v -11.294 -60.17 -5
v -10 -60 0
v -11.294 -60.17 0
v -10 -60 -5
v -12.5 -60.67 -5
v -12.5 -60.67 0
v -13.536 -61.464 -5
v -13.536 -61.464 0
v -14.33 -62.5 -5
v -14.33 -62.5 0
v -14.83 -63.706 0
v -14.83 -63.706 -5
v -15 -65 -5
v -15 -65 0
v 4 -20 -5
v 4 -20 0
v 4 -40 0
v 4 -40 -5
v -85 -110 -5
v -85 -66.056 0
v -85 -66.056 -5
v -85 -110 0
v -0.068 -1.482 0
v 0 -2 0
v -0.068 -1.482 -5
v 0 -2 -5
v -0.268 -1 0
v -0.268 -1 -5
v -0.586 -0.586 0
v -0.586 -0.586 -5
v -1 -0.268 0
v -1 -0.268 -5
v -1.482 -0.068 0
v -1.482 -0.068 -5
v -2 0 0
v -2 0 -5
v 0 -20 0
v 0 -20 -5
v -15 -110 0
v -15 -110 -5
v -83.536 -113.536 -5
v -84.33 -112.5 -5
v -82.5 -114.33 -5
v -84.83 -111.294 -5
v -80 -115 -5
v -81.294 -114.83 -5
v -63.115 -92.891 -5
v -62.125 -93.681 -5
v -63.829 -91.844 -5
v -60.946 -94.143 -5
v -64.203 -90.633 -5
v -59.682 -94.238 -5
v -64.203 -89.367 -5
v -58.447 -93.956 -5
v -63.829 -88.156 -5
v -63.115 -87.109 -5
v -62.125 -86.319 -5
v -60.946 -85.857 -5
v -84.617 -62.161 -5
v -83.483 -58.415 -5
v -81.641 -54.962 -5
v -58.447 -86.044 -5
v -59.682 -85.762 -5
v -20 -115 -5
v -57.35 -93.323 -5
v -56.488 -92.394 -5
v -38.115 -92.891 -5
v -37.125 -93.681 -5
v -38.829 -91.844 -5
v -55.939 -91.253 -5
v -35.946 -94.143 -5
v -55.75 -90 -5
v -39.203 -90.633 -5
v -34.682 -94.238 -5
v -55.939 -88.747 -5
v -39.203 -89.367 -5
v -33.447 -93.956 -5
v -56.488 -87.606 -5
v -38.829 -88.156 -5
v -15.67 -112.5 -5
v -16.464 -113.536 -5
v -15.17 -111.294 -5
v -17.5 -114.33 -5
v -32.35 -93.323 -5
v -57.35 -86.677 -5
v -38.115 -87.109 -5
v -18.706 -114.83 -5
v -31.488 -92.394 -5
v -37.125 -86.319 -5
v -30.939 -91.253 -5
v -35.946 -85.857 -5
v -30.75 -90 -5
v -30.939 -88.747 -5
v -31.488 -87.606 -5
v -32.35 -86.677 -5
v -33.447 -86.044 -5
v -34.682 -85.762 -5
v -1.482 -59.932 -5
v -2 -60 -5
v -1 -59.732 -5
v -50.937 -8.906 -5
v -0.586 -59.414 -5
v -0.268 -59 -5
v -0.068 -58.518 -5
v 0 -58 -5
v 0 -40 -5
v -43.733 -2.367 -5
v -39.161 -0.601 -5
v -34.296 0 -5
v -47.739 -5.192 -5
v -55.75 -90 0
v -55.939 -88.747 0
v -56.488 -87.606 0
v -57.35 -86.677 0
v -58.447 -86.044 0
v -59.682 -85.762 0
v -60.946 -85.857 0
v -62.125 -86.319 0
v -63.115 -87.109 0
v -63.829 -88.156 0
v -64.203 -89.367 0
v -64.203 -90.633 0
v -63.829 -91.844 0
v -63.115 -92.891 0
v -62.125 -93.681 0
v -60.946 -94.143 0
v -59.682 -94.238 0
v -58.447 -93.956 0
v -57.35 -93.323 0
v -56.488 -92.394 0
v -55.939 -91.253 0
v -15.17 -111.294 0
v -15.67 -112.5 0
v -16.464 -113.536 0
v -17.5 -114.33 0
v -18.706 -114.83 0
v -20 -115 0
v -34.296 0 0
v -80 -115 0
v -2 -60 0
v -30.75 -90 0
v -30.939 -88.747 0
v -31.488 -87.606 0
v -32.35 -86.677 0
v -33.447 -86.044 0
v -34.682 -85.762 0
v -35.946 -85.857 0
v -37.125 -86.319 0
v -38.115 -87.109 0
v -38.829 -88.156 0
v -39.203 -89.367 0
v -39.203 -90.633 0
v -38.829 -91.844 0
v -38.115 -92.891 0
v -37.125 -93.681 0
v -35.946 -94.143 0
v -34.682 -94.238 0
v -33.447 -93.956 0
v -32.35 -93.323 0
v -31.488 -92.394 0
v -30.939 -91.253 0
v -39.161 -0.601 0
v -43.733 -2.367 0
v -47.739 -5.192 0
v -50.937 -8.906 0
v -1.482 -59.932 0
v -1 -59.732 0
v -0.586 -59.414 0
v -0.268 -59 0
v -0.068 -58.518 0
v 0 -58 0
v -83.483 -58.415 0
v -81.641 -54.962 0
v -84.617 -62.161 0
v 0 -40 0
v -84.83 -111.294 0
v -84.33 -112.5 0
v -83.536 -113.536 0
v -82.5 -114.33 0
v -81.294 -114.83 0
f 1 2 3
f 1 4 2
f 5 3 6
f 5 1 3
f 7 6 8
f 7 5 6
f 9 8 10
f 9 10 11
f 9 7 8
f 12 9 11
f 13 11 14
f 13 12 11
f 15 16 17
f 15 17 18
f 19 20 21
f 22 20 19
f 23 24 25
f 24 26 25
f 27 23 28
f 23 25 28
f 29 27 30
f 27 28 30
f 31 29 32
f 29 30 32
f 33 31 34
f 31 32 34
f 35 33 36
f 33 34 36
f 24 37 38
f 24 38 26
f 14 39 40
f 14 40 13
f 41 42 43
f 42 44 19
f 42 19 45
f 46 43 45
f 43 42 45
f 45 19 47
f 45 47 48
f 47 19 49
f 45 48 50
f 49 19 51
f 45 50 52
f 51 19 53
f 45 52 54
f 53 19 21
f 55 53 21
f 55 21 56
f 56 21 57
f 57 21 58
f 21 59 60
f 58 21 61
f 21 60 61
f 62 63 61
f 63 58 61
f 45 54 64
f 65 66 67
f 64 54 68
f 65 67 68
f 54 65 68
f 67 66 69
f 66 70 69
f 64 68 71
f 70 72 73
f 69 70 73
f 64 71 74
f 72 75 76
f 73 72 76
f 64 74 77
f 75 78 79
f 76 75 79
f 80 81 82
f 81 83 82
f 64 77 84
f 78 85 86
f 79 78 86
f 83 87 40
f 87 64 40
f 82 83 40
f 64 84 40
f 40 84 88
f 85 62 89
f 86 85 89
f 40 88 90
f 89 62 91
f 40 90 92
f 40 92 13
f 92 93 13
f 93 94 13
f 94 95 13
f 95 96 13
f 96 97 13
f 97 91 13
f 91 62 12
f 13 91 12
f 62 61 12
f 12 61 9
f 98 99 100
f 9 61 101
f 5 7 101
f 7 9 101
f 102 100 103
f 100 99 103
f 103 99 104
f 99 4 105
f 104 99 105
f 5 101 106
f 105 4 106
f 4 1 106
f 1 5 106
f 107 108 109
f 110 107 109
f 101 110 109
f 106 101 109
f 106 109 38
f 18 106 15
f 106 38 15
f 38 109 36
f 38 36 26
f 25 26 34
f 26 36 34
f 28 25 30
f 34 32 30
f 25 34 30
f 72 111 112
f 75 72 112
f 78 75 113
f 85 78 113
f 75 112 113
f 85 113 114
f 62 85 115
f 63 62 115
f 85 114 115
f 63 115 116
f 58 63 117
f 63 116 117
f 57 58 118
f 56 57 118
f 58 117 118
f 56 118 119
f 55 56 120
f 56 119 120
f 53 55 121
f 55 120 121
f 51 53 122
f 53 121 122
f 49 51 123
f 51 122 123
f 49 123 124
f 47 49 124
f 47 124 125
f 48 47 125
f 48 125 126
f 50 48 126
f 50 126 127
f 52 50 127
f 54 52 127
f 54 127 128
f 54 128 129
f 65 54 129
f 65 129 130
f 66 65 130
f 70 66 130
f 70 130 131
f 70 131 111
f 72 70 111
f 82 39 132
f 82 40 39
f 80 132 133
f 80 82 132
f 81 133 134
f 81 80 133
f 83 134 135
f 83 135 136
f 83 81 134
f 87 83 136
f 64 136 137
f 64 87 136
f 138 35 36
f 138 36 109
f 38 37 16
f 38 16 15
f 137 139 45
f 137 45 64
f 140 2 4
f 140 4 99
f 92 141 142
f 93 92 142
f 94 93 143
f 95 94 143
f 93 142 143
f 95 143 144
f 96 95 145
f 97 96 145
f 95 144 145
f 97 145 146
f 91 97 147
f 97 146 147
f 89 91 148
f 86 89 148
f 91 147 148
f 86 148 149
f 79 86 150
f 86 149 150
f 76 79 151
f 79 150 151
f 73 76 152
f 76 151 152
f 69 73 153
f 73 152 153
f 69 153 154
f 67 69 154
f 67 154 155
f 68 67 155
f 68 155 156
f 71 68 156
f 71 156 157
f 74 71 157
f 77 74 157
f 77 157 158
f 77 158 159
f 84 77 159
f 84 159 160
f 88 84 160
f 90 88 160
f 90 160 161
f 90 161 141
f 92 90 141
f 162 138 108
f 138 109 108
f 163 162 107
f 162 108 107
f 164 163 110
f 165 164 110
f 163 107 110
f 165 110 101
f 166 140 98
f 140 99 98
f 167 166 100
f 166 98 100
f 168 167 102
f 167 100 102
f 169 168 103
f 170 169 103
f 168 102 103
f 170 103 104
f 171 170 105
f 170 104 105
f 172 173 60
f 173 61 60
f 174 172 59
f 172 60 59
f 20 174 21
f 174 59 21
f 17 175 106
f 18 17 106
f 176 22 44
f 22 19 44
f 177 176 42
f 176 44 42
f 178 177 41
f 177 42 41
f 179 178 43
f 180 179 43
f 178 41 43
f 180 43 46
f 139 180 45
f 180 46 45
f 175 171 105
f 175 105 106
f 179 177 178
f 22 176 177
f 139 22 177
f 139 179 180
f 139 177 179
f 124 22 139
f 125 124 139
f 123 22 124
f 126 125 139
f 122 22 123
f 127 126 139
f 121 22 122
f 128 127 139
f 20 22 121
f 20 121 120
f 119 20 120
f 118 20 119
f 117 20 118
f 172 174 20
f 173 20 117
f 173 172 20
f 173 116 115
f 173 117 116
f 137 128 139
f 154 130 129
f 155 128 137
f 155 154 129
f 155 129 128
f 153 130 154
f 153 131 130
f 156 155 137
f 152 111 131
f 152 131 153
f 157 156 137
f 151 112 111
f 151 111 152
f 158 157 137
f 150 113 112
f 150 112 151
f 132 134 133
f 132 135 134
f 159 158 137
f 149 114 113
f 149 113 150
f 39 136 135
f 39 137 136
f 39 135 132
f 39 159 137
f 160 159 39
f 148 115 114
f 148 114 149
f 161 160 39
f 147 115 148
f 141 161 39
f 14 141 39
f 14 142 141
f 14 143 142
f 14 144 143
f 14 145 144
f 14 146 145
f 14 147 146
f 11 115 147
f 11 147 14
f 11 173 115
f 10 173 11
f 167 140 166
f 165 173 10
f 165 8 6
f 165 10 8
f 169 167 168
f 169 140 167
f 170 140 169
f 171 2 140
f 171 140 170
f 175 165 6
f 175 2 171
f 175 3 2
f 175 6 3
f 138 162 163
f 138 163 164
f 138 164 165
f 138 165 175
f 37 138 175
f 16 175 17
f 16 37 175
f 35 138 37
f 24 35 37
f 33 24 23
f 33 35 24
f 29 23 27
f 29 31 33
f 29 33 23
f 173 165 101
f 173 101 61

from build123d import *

# Parameters (mm, degrees)
TABAN_FLAN_1_DEPTH          = 5
IZIM8_R                     = 4.25
KES_EKSTR_ZYON1_DEPTH       = 10
RADYUS1_R                   = 20
RADYUS2_R                   = 5
RADYUS3_R                   = 2
IZIM10_W                    = 5
IZIM10_H                    = 20
Y_KSEKLIK_EKSTR_ZYON1_DEPTH = 4


# Sheet-metal steps are written as plain solids
with BuildPart() as part:
    # Çizim1 → Taban-Flanş1 (new body)
    with BuildSketch(Plane.XY):
        Polygon((0, 0), (-45, 0), (-85, -60), (-85, -115), (-15, -115), (-15, -60), (0, -60), align=None)
    extrude(amount=-TABAN_FLAN_1_DEPTH)

    # Çizim8 → Kes-Ekstrüzyon1 (cut)
    with BuildSketch(Plane.XY):
        with Locations((-35, -90)):
            Circle(IZIM8_R)
        with Locations((-60, -90)):
            Circle(IZIM8_R)
    extrude(amount=-KES_EKSTR_ZYON1_DEPTH, mode=Mode.SUBTRACT)

    # Radyus1
    radyus1_edges = [part.edges().sort_by_distance(p)[0] for p in [
        (-85, -60, -2.5),
        (-45, 0, -2.5),
    ]]
    fillet(radyus1_edges, radius=RADYUS1_R)

    # Radyus2
    radyus2_edges = [part.edges().sort_by_distance(p)[0] for p in [
        (-15, -60, -2.5),
        (-15, -115, -2.5),
        (-85, -115, -2.5),
    ]]
    fillet(radyus2_edges, radius=RADYUS2_R)

    # Radyus3
    radyus3_edges = [part.edges().sort_by_distance(p)[0] for p in [
        (0, -60, -2.5),
        (0, 0, -2.5),
    ]]
    fillet(radyus3_edges, radius=RADYUS3_R)

    # Çizim10 → Yükseklik-Ekstrüzyon1 (add)
    with BuildSketch(Plane(origin=(0, 0, 0), x_dir=(0, 0, -1), z_dir=(1, 0, 0))):
        with Locations((2.5, -30)):
            Rectangle(IZIM10_W, IZIM10_H)
    extrude(amount=Y_KSEKLIK_EKSTR_ZYON1_DEPTH)


solid = part.part
